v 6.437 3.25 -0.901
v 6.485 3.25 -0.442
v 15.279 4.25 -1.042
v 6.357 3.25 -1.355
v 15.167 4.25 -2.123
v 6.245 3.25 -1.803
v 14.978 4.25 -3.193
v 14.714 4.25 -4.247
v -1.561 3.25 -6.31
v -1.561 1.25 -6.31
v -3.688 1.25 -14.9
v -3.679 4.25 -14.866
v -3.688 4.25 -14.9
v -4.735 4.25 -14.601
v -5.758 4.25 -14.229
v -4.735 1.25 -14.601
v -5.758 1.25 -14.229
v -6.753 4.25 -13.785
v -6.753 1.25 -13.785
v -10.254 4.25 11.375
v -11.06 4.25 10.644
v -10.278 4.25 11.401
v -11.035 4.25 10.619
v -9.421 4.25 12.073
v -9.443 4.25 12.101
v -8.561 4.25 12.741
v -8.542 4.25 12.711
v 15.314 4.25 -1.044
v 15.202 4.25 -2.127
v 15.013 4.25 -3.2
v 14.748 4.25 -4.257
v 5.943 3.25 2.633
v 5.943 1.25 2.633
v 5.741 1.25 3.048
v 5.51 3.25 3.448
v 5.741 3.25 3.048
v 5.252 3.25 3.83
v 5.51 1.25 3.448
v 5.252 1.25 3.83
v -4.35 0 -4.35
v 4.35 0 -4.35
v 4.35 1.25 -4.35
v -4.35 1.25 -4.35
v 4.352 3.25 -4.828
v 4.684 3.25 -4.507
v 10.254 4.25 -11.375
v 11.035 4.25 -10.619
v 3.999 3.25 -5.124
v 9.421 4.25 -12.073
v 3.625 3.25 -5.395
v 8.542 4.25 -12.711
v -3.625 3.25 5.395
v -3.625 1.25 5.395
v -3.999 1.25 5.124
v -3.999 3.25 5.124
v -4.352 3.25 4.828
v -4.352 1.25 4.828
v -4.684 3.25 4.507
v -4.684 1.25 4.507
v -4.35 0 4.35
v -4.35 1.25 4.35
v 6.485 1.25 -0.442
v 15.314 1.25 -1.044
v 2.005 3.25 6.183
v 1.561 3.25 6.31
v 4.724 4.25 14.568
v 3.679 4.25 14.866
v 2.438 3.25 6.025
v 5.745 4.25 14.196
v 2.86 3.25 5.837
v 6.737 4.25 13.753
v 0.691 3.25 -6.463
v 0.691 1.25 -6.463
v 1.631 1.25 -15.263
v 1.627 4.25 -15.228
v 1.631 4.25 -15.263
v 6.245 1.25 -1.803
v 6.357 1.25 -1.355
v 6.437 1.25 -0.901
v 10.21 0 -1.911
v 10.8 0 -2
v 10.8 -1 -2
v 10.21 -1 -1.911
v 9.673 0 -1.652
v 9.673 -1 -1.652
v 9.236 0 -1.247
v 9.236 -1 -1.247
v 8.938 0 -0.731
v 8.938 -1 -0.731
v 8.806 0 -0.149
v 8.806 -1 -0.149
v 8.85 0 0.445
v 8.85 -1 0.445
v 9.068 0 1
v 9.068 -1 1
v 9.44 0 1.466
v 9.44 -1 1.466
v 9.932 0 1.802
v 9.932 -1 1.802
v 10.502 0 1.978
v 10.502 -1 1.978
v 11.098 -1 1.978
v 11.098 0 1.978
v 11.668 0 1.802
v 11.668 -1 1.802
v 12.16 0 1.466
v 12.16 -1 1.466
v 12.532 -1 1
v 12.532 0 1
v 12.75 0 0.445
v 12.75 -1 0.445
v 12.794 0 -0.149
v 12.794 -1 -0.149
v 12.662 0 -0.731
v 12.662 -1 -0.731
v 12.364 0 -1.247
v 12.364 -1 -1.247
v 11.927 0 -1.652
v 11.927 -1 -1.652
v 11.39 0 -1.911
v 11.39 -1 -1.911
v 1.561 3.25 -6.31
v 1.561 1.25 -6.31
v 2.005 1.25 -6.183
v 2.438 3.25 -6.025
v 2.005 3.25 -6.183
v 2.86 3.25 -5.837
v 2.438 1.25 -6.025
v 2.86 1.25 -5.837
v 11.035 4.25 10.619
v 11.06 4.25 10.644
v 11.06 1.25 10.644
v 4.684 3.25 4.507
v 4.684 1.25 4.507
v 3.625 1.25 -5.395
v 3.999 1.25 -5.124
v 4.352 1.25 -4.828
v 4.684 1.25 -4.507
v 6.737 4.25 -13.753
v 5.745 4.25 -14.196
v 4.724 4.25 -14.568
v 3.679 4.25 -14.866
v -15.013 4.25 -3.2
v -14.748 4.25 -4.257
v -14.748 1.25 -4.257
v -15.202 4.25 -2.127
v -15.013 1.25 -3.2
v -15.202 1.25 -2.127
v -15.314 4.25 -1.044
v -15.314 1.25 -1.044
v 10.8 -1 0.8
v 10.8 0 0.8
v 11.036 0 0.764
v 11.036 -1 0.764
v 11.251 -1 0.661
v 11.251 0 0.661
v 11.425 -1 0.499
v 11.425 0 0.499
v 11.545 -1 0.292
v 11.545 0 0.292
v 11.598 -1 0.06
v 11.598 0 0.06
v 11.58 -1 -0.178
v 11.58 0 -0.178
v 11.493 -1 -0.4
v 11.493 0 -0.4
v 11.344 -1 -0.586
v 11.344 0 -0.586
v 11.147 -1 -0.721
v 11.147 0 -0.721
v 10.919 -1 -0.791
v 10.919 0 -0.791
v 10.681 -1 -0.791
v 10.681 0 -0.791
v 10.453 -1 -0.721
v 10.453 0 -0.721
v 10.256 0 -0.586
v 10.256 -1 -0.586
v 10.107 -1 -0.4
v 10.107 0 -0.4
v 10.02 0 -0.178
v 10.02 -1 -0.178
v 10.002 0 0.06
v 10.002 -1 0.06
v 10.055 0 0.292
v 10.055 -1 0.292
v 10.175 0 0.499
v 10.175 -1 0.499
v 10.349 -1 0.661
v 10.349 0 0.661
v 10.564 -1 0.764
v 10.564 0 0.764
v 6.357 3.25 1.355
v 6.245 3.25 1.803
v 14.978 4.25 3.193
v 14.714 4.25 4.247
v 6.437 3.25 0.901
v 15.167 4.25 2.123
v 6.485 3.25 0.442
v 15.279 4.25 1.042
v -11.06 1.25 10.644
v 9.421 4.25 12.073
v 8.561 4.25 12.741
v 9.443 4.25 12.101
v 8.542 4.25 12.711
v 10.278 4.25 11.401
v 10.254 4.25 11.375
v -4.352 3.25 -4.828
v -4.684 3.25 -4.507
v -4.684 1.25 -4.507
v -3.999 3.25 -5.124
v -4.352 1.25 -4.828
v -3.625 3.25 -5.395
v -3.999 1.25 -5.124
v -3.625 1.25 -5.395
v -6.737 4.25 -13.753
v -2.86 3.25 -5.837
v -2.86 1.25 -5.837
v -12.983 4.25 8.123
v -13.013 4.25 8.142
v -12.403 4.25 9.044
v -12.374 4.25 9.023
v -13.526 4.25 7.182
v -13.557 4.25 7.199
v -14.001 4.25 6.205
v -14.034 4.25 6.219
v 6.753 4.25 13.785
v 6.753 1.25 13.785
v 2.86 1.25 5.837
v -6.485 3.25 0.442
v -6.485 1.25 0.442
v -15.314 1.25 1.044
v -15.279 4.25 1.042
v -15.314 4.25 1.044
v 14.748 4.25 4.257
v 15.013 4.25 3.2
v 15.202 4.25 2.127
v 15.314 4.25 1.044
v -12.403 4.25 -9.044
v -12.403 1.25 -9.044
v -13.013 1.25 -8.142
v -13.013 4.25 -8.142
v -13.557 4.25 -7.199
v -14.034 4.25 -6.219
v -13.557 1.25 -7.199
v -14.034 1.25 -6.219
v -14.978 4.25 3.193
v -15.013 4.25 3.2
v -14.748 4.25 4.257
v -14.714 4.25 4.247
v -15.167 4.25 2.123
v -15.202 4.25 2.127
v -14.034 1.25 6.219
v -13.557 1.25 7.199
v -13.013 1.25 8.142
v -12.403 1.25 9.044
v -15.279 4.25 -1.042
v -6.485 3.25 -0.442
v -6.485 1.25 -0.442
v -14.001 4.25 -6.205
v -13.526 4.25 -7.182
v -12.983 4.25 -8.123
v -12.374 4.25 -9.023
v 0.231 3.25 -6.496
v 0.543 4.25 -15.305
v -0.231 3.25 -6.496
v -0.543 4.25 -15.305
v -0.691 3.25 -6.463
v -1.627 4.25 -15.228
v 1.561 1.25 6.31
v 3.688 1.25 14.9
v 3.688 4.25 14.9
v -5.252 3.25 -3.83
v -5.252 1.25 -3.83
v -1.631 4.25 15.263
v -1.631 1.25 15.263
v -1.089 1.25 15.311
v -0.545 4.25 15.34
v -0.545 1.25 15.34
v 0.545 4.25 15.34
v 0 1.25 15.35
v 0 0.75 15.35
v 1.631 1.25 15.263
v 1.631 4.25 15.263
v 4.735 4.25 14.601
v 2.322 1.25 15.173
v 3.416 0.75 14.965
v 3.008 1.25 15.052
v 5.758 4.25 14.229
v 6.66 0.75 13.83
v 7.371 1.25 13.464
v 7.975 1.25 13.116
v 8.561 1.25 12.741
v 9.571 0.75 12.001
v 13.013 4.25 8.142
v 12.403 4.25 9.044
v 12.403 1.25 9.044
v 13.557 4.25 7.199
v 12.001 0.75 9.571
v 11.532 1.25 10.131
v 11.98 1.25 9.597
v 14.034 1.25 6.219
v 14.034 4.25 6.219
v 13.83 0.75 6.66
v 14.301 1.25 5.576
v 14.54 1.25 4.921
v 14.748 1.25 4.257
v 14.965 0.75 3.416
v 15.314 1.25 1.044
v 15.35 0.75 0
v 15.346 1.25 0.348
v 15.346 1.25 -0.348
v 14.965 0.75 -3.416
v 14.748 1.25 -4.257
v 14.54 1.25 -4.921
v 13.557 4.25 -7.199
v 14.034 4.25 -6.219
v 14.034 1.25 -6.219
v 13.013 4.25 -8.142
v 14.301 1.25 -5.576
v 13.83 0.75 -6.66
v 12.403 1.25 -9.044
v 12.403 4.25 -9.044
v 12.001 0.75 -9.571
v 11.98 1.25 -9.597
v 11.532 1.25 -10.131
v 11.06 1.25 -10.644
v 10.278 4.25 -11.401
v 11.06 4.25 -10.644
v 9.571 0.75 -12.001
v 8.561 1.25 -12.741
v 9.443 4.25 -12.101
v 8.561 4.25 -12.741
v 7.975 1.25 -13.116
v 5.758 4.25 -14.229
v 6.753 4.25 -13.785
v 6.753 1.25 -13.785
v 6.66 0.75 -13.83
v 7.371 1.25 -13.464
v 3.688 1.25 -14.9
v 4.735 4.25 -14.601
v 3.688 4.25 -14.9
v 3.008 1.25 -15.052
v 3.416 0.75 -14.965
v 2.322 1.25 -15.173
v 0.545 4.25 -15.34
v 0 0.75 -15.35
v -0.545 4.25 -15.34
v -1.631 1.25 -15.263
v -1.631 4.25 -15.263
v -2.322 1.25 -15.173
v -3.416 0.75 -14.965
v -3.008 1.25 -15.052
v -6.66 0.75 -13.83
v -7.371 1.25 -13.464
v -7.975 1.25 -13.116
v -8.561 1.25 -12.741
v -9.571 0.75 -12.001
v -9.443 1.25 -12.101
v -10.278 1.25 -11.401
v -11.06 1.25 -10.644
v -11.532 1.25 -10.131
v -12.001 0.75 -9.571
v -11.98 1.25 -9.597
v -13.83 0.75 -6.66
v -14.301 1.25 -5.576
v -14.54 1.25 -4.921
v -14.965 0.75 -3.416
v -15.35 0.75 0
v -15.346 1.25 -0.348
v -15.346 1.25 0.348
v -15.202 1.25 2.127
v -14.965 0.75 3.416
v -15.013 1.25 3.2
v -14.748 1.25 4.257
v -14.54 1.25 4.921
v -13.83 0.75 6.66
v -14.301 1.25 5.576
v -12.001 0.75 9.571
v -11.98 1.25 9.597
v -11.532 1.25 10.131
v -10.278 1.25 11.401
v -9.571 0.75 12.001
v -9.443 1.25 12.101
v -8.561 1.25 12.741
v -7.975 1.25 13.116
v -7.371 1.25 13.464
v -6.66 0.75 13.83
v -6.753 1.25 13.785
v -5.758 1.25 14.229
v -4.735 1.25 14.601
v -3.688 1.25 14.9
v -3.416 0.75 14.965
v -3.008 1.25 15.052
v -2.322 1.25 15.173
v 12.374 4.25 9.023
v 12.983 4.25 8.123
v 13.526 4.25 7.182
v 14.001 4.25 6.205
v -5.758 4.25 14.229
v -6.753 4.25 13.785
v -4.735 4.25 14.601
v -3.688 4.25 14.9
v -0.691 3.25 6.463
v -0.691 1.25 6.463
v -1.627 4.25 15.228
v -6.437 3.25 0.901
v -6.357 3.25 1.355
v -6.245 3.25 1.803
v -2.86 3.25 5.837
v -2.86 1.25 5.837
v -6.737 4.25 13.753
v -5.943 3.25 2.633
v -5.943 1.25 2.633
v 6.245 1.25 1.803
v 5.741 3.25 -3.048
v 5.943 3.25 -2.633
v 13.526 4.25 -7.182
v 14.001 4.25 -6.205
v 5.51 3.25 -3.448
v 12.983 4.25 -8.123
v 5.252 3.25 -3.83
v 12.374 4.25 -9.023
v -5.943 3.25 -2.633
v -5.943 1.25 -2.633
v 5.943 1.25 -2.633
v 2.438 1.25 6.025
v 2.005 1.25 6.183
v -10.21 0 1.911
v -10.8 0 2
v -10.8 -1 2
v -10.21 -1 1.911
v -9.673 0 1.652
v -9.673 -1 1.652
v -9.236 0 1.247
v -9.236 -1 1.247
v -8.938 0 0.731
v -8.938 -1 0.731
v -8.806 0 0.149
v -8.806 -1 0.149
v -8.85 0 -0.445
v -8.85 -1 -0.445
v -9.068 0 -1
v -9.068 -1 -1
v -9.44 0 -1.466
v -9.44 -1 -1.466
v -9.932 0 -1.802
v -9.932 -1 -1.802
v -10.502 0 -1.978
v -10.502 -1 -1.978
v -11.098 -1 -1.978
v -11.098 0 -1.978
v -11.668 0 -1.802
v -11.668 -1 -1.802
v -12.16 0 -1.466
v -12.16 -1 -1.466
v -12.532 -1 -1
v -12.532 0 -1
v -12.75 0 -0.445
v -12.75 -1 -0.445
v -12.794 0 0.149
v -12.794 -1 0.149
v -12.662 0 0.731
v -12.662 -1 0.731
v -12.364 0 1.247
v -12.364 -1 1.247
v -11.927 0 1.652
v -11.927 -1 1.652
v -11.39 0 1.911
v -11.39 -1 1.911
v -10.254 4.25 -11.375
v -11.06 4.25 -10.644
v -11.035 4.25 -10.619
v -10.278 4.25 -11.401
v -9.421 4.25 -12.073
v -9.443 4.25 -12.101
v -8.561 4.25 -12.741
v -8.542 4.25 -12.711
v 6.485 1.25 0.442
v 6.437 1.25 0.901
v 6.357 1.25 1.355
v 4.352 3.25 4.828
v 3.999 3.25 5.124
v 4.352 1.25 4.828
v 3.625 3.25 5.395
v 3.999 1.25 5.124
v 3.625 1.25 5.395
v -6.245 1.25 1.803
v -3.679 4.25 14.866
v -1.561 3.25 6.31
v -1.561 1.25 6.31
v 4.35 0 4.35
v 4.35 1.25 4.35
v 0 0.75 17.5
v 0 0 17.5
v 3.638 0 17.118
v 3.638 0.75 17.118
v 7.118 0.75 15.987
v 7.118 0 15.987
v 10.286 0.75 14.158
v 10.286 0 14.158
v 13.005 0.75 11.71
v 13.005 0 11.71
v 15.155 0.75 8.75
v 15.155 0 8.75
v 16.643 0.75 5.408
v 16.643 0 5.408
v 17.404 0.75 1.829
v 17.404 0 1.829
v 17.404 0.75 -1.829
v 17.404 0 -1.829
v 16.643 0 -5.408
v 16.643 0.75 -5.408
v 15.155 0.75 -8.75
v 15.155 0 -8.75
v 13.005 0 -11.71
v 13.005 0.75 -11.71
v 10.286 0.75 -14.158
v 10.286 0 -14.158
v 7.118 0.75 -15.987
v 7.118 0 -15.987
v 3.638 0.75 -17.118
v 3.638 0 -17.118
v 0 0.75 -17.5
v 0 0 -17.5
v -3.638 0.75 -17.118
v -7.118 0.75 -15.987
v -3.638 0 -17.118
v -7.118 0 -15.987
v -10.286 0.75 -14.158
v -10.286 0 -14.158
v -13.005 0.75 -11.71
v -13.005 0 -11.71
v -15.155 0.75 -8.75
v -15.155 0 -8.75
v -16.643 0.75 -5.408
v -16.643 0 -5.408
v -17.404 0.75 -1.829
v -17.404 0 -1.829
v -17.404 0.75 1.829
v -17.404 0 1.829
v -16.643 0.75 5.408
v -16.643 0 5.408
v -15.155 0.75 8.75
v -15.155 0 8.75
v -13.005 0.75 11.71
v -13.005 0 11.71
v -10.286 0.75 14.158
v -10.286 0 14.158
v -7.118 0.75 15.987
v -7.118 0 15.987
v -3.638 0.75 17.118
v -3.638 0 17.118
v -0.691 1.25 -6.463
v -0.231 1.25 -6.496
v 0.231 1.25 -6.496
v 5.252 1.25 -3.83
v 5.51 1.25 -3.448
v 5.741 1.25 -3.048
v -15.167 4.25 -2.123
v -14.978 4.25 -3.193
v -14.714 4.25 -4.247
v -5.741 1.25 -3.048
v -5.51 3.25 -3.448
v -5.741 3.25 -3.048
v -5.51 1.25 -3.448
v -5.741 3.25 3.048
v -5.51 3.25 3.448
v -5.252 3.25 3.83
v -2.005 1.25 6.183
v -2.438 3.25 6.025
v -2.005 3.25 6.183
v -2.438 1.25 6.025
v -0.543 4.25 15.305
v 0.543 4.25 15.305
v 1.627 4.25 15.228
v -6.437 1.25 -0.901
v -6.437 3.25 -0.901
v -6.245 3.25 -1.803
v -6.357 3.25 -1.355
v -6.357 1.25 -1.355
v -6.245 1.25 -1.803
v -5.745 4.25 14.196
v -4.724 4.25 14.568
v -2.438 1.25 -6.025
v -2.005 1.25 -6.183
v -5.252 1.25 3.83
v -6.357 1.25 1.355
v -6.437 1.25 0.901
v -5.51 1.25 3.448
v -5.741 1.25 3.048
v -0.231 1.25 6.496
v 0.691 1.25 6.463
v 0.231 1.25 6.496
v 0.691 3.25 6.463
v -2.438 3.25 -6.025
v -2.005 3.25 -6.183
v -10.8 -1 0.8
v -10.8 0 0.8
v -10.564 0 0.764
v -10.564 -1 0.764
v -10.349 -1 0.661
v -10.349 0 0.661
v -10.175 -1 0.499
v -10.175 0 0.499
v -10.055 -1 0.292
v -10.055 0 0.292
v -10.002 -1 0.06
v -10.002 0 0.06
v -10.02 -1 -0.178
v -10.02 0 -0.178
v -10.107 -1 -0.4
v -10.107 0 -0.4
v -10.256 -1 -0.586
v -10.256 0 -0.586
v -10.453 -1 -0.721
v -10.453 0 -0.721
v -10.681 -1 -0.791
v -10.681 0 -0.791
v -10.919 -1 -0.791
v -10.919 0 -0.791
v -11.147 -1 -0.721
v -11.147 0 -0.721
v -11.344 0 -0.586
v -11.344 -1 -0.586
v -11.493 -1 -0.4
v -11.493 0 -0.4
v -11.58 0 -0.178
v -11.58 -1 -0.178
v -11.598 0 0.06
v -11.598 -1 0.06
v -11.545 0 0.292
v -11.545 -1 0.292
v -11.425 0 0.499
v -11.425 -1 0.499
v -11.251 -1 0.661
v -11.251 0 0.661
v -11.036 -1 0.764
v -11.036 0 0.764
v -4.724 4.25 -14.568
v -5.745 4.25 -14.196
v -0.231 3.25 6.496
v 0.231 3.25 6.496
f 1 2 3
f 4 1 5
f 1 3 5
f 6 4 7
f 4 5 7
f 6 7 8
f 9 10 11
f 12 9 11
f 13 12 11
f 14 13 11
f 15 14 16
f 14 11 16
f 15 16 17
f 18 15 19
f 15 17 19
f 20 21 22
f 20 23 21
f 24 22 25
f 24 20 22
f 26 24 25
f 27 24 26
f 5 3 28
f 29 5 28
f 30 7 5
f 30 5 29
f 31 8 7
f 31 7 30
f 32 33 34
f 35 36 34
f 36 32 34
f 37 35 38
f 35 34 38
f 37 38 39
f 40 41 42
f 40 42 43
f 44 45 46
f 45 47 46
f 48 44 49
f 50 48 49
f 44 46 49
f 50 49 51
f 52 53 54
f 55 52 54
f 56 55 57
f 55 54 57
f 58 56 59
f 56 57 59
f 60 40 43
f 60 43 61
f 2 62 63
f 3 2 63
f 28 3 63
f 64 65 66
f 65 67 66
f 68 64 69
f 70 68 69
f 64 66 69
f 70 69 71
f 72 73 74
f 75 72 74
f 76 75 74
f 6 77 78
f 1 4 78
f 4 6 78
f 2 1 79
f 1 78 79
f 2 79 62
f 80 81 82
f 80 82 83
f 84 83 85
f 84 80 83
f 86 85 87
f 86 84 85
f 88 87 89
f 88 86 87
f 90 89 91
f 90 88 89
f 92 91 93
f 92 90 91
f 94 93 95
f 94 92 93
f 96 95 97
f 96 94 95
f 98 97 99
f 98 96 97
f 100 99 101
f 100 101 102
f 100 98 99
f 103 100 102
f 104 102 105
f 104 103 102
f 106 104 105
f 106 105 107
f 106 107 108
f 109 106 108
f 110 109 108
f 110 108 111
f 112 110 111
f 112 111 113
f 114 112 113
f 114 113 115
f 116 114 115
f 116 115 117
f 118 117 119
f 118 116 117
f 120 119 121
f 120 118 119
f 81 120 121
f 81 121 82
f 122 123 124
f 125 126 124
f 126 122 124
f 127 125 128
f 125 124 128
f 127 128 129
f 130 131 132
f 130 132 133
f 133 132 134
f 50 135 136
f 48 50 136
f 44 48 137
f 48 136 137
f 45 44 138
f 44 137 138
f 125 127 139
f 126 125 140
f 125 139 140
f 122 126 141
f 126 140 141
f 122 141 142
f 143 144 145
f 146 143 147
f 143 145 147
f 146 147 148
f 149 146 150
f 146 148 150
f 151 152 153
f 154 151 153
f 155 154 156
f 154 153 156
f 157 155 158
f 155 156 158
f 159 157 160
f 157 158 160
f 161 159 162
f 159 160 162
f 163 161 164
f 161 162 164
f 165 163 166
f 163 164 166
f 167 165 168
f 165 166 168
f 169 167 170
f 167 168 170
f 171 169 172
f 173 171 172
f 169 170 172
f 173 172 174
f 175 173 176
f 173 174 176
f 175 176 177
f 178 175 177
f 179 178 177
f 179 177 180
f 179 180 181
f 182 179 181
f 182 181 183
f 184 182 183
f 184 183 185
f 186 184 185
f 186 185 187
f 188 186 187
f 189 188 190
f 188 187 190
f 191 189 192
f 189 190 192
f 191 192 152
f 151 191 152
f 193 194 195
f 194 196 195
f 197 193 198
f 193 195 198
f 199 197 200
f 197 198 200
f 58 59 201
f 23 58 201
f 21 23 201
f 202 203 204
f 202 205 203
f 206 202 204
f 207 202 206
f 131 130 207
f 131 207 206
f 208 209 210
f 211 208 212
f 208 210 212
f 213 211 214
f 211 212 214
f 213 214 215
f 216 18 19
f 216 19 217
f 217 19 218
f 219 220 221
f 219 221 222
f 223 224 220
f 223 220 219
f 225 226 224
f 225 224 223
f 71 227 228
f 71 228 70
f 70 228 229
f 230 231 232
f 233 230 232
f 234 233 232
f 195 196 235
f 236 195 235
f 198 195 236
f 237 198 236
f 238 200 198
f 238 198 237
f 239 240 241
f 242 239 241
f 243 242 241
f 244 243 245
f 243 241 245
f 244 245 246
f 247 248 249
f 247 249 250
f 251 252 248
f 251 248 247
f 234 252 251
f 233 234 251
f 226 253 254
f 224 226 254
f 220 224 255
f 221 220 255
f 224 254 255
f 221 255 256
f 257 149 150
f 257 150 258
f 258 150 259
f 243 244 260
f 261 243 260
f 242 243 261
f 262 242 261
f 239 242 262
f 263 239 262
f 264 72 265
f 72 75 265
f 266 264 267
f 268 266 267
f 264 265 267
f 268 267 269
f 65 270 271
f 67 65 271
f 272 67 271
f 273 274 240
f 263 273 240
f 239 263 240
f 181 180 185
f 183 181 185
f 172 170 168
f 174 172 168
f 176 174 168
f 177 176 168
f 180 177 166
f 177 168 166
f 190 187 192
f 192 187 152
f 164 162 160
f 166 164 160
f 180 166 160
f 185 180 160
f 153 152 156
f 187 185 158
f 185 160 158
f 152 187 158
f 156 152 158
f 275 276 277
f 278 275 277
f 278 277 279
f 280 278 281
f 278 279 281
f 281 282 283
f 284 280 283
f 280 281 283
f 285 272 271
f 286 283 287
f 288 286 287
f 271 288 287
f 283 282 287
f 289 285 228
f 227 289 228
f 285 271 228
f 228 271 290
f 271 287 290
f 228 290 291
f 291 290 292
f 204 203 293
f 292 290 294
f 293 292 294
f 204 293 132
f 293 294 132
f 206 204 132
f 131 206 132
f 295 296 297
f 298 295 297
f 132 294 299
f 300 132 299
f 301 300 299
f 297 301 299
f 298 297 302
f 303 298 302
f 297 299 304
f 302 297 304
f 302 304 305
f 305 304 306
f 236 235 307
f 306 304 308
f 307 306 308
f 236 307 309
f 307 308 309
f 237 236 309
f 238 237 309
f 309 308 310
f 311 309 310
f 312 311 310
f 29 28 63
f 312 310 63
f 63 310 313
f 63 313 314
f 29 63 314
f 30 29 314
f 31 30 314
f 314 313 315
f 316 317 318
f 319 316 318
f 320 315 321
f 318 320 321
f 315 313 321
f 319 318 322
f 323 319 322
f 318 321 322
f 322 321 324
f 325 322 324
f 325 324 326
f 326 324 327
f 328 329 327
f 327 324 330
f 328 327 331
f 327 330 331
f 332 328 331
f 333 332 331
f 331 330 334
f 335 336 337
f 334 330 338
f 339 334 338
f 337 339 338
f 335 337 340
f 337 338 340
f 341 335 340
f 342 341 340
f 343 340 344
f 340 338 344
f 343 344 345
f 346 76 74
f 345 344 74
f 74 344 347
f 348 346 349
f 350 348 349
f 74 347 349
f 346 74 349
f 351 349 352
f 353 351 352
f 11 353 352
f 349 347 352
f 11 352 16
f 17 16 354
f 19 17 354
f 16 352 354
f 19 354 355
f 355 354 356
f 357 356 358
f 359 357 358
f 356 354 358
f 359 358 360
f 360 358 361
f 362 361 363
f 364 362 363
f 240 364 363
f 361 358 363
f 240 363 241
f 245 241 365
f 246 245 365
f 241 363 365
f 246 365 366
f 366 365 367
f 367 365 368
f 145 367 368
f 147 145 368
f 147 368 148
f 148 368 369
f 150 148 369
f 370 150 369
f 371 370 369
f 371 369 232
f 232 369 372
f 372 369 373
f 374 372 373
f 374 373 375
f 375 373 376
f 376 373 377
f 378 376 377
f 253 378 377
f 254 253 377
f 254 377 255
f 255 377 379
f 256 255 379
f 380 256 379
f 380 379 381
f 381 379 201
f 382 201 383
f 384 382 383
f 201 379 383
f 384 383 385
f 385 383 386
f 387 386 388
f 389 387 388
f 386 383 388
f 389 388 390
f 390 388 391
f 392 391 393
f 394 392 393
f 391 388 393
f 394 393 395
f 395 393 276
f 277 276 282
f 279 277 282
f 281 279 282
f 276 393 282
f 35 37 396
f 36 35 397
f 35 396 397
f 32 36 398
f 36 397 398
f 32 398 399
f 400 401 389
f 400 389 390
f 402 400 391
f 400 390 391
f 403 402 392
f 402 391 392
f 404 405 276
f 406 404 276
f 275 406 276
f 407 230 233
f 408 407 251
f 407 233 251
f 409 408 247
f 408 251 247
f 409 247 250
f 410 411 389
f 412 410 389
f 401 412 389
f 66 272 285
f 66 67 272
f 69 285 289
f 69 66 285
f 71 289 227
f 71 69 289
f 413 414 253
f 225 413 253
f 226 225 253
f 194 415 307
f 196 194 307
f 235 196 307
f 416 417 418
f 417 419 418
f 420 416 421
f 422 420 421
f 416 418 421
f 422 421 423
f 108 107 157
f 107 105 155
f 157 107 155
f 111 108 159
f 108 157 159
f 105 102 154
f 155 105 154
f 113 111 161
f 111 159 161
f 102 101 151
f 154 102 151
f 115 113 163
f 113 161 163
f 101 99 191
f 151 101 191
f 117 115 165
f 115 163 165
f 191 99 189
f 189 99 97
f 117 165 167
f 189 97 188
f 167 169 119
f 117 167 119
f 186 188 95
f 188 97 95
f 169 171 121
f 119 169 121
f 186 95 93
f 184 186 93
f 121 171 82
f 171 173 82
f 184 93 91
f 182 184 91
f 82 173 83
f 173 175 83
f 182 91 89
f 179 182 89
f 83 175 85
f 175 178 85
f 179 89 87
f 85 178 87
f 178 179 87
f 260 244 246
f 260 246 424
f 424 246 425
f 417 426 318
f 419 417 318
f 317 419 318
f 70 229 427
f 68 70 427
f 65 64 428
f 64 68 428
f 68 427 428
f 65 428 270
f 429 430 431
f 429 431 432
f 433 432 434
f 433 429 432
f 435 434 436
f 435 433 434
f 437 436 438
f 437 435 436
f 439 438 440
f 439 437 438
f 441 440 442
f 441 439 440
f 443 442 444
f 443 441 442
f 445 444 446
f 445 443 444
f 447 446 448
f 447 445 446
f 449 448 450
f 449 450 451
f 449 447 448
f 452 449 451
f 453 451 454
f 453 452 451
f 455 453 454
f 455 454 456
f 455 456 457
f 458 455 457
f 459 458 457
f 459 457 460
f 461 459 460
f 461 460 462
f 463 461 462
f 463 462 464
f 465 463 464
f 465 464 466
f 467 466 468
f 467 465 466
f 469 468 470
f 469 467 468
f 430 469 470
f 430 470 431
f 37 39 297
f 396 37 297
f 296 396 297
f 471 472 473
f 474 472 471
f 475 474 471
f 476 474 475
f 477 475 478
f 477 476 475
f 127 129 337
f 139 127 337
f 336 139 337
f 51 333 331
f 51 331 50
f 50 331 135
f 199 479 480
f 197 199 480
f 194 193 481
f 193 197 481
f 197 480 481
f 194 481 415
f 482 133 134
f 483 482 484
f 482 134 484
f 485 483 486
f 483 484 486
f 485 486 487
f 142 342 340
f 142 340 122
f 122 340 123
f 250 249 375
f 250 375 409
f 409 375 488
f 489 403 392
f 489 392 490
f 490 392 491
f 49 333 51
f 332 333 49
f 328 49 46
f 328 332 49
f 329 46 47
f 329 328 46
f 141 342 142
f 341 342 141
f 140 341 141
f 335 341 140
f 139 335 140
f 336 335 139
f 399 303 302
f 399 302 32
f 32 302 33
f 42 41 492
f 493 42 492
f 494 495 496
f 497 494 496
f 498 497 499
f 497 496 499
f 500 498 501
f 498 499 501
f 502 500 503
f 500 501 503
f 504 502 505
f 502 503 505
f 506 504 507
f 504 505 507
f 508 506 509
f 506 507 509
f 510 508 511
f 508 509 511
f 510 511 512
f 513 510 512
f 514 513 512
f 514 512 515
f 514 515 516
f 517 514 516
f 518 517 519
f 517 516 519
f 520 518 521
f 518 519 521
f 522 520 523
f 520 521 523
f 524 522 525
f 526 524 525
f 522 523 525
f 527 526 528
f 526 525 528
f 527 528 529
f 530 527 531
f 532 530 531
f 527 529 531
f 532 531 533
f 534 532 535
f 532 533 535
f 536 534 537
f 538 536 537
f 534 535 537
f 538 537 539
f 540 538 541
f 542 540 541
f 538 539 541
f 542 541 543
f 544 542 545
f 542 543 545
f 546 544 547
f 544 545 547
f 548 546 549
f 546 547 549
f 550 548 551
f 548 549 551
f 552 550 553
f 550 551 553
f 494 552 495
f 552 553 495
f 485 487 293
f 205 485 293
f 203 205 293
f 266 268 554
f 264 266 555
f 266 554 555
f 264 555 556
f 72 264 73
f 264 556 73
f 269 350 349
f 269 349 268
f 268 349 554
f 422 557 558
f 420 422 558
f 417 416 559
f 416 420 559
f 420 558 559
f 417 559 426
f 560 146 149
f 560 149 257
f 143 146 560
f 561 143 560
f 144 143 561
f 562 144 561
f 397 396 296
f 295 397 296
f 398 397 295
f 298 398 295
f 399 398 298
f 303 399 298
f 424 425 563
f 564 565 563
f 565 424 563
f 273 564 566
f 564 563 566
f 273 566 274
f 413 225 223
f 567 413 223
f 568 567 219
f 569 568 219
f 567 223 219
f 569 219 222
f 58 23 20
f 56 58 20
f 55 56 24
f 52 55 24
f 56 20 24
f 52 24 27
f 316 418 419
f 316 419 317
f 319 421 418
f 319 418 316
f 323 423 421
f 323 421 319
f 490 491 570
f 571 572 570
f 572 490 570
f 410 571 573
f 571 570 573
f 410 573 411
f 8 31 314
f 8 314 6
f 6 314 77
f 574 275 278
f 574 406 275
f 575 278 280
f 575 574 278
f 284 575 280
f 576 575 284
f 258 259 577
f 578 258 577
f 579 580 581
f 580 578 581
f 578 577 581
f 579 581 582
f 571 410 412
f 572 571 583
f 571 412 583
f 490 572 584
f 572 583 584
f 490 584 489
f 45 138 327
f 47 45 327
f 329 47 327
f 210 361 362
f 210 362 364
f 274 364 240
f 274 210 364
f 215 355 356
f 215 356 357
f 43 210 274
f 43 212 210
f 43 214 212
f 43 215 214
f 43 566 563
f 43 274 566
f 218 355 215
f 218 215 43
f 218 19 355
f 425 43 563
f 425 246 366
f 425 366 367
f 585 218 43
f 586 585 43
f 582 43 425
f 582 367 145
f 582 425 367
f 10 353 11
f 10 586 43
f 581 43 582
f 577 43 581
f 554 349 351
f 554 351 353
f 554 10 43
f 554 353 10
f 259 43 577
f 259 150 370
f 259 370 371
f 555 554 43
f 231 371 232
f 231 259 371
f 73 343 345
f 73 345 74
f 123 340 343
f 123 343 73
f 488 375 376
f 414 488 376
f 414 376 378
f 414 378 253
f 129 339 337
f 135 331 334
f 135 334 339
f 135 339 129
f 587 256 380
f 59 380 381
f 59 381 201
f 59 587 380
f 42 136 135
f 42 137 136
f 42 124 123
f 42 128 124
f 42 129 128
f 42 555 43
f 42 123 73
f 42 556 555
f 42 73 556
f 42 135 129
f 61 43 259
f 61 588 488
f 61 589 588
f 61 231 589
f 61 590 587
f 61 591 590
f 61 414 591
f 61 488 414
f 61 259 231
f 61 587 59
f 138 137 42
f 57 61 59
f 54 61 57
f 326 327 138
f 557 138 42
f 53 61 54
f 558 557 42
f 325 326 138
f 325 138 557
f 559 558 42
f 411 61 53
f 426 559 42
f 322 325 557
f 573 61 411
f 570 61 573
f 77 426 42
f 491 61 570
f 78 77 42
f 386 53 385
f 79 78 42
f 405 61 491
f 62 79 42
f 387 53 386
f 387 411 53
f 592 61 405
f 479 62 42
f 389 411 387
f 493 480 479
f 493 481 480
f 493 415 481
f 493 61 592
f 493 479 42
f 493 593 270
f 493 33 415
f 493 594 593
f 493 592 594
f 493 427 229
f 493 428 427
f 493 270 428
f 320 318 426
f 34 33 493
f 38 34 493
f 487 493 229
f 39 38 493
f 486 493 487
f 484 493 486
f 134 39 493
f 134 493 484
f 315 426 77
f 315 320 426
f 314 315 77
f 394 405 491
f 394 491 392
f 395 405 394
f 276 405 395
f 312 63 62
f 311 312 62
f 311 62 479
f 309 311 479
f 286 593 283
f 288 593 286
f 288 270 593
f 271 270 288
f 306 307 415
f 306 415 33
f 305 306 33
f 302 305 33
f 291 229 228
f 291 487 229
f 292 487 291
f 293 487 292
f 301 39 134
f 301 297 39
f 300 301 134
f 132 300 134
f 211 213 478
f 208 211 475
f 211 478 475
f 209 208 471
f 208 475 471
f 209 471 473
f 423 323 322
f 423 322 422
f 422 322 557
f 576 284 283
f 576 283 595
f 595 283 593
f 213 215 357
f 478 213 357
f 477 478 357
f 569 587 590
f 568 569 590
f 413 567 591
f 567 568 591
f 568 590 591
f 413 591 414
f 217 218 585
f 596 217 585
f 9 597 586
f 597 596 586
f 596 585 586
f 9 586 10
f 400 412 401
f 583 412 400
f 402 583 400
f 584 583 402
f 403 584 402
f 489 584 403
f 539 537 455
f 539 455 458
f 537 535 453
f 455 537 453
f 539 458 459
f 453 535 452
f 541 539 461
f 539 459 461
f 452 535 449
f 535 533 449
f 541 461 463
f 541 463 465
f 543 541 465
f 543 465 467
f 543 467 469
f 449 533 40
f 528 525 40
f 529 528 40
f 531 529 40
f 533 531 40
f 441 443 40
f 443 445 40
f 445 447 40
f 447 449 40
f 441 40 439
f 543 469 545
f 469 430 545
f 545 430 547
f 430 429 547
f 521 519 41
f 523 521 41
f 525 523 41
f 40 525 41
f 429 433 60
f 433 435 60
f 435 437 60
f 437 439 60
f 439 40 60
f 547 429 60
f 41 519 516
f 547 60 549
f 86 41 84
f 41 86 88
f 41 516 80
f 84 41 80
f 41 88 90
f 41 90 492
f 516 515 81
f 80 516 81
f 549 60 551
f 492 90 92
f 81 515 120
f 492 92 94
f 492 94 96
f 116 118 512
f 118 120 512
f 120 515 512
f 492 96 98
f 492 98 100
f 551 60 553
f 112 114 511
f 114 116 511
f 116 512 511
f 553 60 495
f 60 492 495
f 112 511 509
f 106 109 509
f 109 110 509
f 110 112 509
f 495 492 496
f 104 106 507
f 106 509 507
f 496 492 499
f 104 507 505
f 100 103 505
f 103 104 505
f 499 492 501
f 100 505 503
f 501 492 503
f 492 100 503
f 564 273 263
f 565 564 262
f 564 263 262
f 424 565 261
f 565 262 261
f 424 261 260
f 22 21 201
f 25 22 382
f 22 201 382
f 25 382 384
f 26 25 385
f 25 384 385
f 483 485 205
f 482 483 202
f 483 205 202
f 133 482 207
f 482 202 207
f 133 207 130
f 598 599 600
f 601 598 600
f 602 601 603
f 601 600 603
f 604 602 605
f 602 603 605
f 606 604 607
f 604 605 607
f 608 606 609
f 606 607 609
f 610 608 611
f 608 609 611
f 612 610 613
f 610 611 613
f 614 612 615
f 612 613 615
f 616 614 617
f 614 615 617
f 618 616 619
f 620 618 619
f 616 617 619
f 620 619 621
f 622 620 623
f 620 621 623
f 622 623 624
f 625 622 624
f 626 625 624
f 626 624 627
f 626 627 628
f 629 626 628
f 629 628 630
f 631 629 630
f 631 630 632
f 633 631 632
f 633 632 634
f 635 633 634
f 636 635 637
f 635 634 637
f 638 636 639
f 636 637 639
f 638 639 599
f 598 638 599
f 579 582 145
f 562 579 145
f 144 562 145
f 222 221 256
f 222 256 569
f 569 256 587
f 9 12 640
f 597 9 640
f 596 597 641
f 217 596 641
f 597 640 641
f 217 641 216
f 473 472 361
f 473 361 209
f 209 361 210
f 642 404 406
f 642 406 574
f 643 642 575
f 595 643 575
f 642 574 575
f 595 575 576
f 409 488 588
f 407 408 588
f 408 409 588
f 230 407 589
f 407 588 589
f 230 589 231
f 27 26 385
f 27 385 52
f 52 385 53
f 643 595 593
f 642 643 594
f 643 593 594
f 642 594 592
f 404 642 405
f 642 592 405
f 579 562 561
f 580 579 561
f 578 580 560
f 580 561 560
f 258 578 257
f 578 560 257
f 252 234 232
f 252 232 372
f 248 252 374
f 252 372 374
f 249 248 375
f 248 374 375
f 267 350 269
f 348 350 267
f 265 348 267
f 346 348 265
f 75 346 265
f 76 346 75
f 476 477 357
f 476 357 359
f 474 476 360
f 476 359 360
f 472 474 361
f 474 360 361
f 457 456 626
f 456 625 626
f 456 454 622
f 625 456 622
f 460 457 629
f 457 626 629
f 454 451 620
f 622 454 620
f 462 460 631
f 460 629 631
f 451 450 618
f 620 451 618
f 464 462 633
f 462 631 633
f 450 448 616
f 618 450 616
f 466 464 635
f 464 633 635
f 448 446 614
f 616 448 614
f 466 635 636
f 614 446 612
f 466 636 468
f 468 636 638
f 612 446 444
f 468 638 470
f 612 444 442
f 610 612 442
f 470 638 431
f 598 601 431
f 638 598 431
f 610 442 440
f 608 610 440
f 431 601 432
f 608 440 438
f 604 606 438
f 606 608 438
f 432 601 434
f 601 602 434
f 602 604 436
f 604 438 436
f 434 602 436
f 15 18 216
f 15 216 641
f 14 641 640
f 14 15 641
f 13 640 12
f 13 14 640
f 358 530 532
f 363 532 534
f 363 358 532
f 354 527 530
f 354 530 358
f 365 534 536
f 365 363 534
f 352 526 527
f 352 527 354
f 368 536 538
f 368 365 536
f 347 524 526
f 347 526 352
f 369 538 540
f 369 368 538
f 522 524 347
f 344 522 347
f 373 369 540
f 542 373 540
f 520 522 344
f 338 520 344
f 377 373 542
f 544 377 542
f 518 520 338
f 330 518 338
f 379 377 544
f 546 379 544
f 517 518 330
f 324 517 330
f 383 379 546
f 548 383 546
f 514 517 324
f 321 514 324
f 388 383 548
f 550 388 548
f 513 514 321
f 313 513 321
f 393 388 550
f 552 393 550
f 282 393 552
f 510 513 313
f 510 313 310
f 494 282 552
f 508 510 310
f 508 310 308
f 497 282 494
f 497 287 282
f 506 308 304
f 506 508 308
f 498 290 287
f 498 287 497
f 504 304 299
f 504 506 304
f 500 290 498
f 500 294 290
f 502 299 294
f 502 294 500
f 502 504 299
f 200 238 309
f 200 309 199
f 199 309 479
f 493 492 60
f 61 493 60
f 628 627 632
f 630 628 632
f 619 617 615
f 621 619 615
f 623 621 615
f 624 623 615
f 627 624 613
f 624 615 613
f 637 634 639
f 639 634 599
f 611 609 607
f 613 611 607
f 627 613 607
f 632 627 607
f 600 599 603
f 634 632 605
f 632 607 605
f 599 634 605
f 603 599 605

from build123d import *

# Parameters (mm, degrees)
SKETCH2_R           = 15.35
BOSS_EXTRUDE3_DEPTH = 1.25
SKETCH5_W           = 8.7
SKETCH5_H           = 8.7
CUT_EXTRUDE3_DEPTH  = 1.25
BOSS_EXTRUDE4_DEPTH = 4.25
SKETCH1_R           = 17.5
SKETCH1_R_2         = 15.35
BOSS_EXTRUDE5_DEPTH = 0.75
SKETCH8_R           = 2
SKETCH8_R_2         = 0.8
BOSS_EXTRUDE6_DEPTH = 1


with BuildPart() as part:
    # Sketch2 → Boss-Extrude3 (new body)
    with BuildSketch(Plane(origin=(0, 0, 0), x_dir=(1, 0, 0), z_dir=(0, 1, 0))):
        with Locations(Location((0, 0, 0), (0, 0, 270))):
            Circle(SKETCH2_R)
    extrude(amount=BOSS_EXTRUDE3_DEPTH)

    # Sketch5 → Cut-Extrude3 (cut)
    with BuildSketch(Plane(origin=(0, 0, 0), x_dir=(-1, 0, 0), z_dir=(0, 1, 0))):
        Rectangle(SKETCH5_W, SKETCH5_H)
    extrude(amount=CUT_EXTRUDE3_DEPTH, mode=Mode.SUBTRACT)

    # Sketch3 → Boss-Extrude4 (add)
    with BuildSketch(Plane(origin=(0, 0, 0), x_dir=(1, 0, 0), z_dir=(0, 1, 0))):
        with BuildLine():
            Line((-1.631153495, 15.263087442), (-0.690716464, 6.463196637))
            ThreePointArc((-0.690716464, 6.463196637), (0, 6.5), (0.690716464, 6.463196637))
            Line((0.690716464, 6.463196637), (1.631153495, 15.263087442))
            ThreePointArc((1.631153495, 15.263087442), (0, 15.35), (-1.631153495, 15.263087442))
        make_face()
        with BuildLine():
            Line((3.687500452, 14.900497992), (1.561482276, 6.30965713))
            ThreePointArc((1.561482276, 6.30965713), (2.223130932, 6.108002035), (2.859604604, 5.837179242))
            Line((2.859604604, 5.837179242), (6.753066257, 13.784723288))
            ThreePointArc((6.753066257, 13.784723288), (5.2500092, 14.424281729), (3.687500452, 14.900497992))
        make_face()
        with BuildLine():
            Line((8.561387423, 12.740688576), (3.625343208, 5.395079853))
            ThreePointArc((3.625343208, 5.395079853), (4.178119463, 4.97928888), (4.683582226, 4.507111884))
            Line((4.683582226, 4.507111884), (11.060459564, 10.643718064))
            ThreePointArc((11.060459564, 10.643718064), (9.866789809, 11.758782202), (8.561387423, 12.740688576))
        make_face()
        with BuildLine():
            Line((12.402644718, 9.044164085), (5.251934245, 3.829776323))
            ThreePointArc((5.251934245, 3.829776323), (5.629165125, 3.25), (5.942650709, 2.633420314))
            Line((5.942650709, 2.633420314), (14.033798213, 6.218923357))
            ThreePointArc((14.033798213, 6.218923357), (13.293489948, 7.675), (12.402644718, 9.044164085))
        make_face()
        with BuildLine():
            Line((14.747960016, 4.256779928), (6.245064502, 1.802545246))
            ThreePointArc((6.245064502, 1.802545246), (6.401250395, 1.128713155), (6.484947812, 0.442099389))
            Line((6.484947812, 0.442099389), (15.31445368, 1.044034712))
            ThreePointArc((15.31445368, 1.044034712), (15.116799009, 2.665499527), (14.747960016, 4.256779928))
        make_face()
        with BuildLine():
            Line((15.31445368, -1.044034712), (6.484947812, -0.442099389))
            ThreePointArc((6.484947812, -0.442099389), (6.401250395, -1.128713155), (6.245064502, -1.802545246))
            Line((6.245064502, -1.802545246), (14.747960016, -4.256779928))
            ThreePointArc((14.747960016, -4.256779928), (15.116799009, -2.665499527), (15.31445368, -1.044034712))
        make_face()
        with BuildLine():
            Line((14.033798213, -6.218923357), (5.942650709, -2.633420314))
            ThreePointArc((5.942650709, -2.633420314), (5.629165125, -3.25), (5.251934245, -3.829776323))
            Line((5.251934245, -3.829776323), (12.402644718, -9.044164085))
            ThreePointArc((12.402644718, -9.044164085), (13.293489948, -7.675), (14.033798213, -6.218923357))
        make_face()
        with BuildLine():
            Line((11.060459564, -10.643718064), (4.683582226, -4.507111884))
            ThreePointArc((4.683582226, -4.507111884), (4.178119463, -4.97928888), (3.625343208, -5.395079853))
            Line((3.625343208, -5.395079853), (8.561387423, -12.740688576))
            ThreePointArc((8.561387423, -12.740688576), (9.866789809, -11.758782202), (11.060459564, -10.643718064))
        make_face()
        with BuildLine():
            Line((6.753066257, -13.784723288), (2.859604604, -5.837179242))
            ThreePointArc((2.859604604, -5.837179242), (2.223130932, -6.108002035), (1.561482276, -6.30965713))
            Line((1.561482276, -6.30965713), (3.687500452, -14.900497992))
            ThreePointArc((3.687500452, -14.900497992), (5.2500092, -14.424281729), (6.753066257, -13.784723288))
        make_face()
        with BuildLine():
            Line((1.631153495, -15.263087442), (0.690716464, -6.463196637))
            ThreePointArc((0.690716464, -6.463196637), (0, -6.5), (-0.690716464, -6.463196637))
            Line((-0.690716464, -6.463196637), (-1.631153495, -15.263087442))
            ThreePointArc((-1.631153495, -15.263087442), (0, -15.35), (1.631153495, -15.263087442))
        make_face()
        with BuildLine():
            Line((-3.687500452, -14.900497992), (-1.561482276, -6.30965713))
            ThreePointArc((-1.561482276, -6.30965713), (-2.223130932, -6.108002035), (-2.859604604, -5.837179242))
            Line((-2.859604604, -5.837179242), (-6.753066257, -13.784723288))
            ThreePointArc((-6.753066257, -13.784723288), (-5.2500092, -14.424281729), (-3.687500452, -14.900497992))
        make_face()
        with BuildLine():
            Line((-8.561387423, -12.740688576), (-3.625343208, -5.395079853))
            ThreePointArc((-3.625343208, -5.395079853), (-4.178119463, -4.97928888), (-4.683582226, -4.507111884))
            Line((-4.683582226, -4.507111884), (-11.060459564, -10.643718064))
            ThreePointArc((-11.060459564, -10.643718064), (-9.866789809, -11.758782202), (-8.561387423, -12.740688576))
        make_face()
        with BuildLine():
            Line((-12.402644718, -9.044164085), (-5.251934245, -3.829776323))
            ThreePointArc((-5.251934245, -3.829776323), (-5.629165125, -3.25), (-5.942650709, -2.633420314))
            Line((-5.942650709, -2.633420314), (-14.033798213, -6.218923357))
            ThreePointArc((-14.033798213, -6.218923357), (-13.293489948, -7.675), (-12.402644718, -9.044164085))
        make_face()
        with BuildLine():
            Line((-14.747960016, -4.256779928), (-6.245064502, -1.802545246))
            ThreePointArc((-6.245064502, -1.802545246), (-6.401250395, -1.128713155), (-6.484947812, -0.442099389))
            Line((-6.484947812, -0.442099389), (-15.31445368, -1.044034712))
            ThreePointArc((-15.31445368, -1.044034712), (-15.116799009, -2.665499527), (-14.747960016, -4.256779928))
        make_face()
        with BuildLine():
            Line((-15.31445368, 1.044034712), (-6.484947812, 0.442099389))
            ThreePointArc((-6.484947812, 0.442099389), (-6.401250395, 1.128713155), (-6.245064502, 1.802545246))
            Line((-6.245064502, 1.802545246), (-14.747960016, 4.256779928))
            ThreePointArc((-14.747960016, 4.256779928), (-15.116799009, 2.665499527), (-15.31445368, 1.044034712))
        make_face()
        with BuildLine():
            Line((-14.033798213, 6.218923357), (-5.942650709, 2.633420314))
            ThreePointArc((-5.942650709, 2.633420314), (-5.629165125, 3.25), (-5.251934245, 3.829776323))
            Line((-5.251934245, 3.829776323), (-12.402644718, 9.044164085))
            ThreePointArc((-12.402644718, 9.044164085), (-13.293489948, 7.675), (-14.033798213, 6.218923357))
        make_face()
        with BuildLine():
            Line((-11.060459564, 10.643718064), (-4.683582226, 4.507111884))
            ThreePointArc((-4.683582226, 4.507111884), (-4.178119463, 4.97928888), (-3.625343208, 5.395079853))
            Line((-3.625343208, 5.395079853), (-8.561387423, 12.740688576))
            ThreePointArc((-8.561387423, 12.740688576), (-9.866789809, 11.758782202), (-11.060459564, 10.643718064))
        make_face()
        with BuildLine():
            Line((-6.753066257, 13.784723288), (-2.859604604, 5.837179242))
            ThreePointArc((-2.859604604, 5.837179242), (-2.223130932, 6.108002035), (-1.561482276, 6.30965713))
            Line((-1.561482276, 6.30965713), (-3.687500452, 14.900497992))
            ThreePointArc((-3.687500452, 14.900497992), (-5.2500092, 14.424281729), (-6.753066257, 13.784723288))
        make_face()
    extrude(amount=BOSS_EXTRUDE4_DEPTH)

    # Sketch7 → Cut-Revolve1 (revolve, cut)
    with BuildSketch(Plane.XY, mode=Mode.PRIVATE) as cut_revolve1_sk:
        Polygon((6.5, 3.25), (15.31445368, 4.25), (6.5, 4.25), align=None)
    revolve(cut_revolve1_sk.sketch.rotate(Axis((0, 3.25, 0), (0, 1, 0)), 83.9), axis=Axis((0, 3.25, 0), (0, 1, 0)), mode=Mode.SUBTRACT)

    # Sketch1 → Boss-Extrude5 (add)
    with BuildSketch(Plane(origin=(0, 0, 0), x_dir=(1, 0, 0), z_dir=(0, 1, 0))):
        with Locations(Location((0, 0, 0), (0, 0, 270))):
            Circle(SKETCH1_R)
        with Locations(Location((0, 0, 0), (0, 0, 83.9))):
            Circle(SKETCH1_R_2, mode=Mode.SUBTRACT)
    extrude(amount=BOSS_EXTRUDE5_DEPTH)

    # Sketch8 → Boss-Extrude6 (add)
    # profile 1 of 2: a face of its own
    with BuildSketch(Plane(origin=(0, 0, 0), x_dir=(1, 0, 0), z_dir=(0, 1, 0))):
        with Locations(Location((-10.8, 0, 0), (0, 0, 270))):
            Circle(SKETCH8_R)
        with Locations(Location((-10.8, 0, 0), (0, 0, 270))):
            Circle(SKETCH8_R_2, mode=Mode.SUBTRACT)
    # profile 2 of 2: a face of its own
    with BuildSketch(Plane(origin=(0, 0, 0), x_dir=(1, 0, 0), z_dir=(0, 1, 0))):
        with Locations(Location((10.8, 0, 0), (0, 0, 90))):
            Circle(SKETCH8_R)
        with Locations(Location((10.8, 0, 0), (0, 0, 270))):
            Circle(SKETCH8_R_2, mode=Mode.SUBTRACT)
    extrude(amount=-BOSS_EXTRUDE6_DEPTH)


solid = part.part
